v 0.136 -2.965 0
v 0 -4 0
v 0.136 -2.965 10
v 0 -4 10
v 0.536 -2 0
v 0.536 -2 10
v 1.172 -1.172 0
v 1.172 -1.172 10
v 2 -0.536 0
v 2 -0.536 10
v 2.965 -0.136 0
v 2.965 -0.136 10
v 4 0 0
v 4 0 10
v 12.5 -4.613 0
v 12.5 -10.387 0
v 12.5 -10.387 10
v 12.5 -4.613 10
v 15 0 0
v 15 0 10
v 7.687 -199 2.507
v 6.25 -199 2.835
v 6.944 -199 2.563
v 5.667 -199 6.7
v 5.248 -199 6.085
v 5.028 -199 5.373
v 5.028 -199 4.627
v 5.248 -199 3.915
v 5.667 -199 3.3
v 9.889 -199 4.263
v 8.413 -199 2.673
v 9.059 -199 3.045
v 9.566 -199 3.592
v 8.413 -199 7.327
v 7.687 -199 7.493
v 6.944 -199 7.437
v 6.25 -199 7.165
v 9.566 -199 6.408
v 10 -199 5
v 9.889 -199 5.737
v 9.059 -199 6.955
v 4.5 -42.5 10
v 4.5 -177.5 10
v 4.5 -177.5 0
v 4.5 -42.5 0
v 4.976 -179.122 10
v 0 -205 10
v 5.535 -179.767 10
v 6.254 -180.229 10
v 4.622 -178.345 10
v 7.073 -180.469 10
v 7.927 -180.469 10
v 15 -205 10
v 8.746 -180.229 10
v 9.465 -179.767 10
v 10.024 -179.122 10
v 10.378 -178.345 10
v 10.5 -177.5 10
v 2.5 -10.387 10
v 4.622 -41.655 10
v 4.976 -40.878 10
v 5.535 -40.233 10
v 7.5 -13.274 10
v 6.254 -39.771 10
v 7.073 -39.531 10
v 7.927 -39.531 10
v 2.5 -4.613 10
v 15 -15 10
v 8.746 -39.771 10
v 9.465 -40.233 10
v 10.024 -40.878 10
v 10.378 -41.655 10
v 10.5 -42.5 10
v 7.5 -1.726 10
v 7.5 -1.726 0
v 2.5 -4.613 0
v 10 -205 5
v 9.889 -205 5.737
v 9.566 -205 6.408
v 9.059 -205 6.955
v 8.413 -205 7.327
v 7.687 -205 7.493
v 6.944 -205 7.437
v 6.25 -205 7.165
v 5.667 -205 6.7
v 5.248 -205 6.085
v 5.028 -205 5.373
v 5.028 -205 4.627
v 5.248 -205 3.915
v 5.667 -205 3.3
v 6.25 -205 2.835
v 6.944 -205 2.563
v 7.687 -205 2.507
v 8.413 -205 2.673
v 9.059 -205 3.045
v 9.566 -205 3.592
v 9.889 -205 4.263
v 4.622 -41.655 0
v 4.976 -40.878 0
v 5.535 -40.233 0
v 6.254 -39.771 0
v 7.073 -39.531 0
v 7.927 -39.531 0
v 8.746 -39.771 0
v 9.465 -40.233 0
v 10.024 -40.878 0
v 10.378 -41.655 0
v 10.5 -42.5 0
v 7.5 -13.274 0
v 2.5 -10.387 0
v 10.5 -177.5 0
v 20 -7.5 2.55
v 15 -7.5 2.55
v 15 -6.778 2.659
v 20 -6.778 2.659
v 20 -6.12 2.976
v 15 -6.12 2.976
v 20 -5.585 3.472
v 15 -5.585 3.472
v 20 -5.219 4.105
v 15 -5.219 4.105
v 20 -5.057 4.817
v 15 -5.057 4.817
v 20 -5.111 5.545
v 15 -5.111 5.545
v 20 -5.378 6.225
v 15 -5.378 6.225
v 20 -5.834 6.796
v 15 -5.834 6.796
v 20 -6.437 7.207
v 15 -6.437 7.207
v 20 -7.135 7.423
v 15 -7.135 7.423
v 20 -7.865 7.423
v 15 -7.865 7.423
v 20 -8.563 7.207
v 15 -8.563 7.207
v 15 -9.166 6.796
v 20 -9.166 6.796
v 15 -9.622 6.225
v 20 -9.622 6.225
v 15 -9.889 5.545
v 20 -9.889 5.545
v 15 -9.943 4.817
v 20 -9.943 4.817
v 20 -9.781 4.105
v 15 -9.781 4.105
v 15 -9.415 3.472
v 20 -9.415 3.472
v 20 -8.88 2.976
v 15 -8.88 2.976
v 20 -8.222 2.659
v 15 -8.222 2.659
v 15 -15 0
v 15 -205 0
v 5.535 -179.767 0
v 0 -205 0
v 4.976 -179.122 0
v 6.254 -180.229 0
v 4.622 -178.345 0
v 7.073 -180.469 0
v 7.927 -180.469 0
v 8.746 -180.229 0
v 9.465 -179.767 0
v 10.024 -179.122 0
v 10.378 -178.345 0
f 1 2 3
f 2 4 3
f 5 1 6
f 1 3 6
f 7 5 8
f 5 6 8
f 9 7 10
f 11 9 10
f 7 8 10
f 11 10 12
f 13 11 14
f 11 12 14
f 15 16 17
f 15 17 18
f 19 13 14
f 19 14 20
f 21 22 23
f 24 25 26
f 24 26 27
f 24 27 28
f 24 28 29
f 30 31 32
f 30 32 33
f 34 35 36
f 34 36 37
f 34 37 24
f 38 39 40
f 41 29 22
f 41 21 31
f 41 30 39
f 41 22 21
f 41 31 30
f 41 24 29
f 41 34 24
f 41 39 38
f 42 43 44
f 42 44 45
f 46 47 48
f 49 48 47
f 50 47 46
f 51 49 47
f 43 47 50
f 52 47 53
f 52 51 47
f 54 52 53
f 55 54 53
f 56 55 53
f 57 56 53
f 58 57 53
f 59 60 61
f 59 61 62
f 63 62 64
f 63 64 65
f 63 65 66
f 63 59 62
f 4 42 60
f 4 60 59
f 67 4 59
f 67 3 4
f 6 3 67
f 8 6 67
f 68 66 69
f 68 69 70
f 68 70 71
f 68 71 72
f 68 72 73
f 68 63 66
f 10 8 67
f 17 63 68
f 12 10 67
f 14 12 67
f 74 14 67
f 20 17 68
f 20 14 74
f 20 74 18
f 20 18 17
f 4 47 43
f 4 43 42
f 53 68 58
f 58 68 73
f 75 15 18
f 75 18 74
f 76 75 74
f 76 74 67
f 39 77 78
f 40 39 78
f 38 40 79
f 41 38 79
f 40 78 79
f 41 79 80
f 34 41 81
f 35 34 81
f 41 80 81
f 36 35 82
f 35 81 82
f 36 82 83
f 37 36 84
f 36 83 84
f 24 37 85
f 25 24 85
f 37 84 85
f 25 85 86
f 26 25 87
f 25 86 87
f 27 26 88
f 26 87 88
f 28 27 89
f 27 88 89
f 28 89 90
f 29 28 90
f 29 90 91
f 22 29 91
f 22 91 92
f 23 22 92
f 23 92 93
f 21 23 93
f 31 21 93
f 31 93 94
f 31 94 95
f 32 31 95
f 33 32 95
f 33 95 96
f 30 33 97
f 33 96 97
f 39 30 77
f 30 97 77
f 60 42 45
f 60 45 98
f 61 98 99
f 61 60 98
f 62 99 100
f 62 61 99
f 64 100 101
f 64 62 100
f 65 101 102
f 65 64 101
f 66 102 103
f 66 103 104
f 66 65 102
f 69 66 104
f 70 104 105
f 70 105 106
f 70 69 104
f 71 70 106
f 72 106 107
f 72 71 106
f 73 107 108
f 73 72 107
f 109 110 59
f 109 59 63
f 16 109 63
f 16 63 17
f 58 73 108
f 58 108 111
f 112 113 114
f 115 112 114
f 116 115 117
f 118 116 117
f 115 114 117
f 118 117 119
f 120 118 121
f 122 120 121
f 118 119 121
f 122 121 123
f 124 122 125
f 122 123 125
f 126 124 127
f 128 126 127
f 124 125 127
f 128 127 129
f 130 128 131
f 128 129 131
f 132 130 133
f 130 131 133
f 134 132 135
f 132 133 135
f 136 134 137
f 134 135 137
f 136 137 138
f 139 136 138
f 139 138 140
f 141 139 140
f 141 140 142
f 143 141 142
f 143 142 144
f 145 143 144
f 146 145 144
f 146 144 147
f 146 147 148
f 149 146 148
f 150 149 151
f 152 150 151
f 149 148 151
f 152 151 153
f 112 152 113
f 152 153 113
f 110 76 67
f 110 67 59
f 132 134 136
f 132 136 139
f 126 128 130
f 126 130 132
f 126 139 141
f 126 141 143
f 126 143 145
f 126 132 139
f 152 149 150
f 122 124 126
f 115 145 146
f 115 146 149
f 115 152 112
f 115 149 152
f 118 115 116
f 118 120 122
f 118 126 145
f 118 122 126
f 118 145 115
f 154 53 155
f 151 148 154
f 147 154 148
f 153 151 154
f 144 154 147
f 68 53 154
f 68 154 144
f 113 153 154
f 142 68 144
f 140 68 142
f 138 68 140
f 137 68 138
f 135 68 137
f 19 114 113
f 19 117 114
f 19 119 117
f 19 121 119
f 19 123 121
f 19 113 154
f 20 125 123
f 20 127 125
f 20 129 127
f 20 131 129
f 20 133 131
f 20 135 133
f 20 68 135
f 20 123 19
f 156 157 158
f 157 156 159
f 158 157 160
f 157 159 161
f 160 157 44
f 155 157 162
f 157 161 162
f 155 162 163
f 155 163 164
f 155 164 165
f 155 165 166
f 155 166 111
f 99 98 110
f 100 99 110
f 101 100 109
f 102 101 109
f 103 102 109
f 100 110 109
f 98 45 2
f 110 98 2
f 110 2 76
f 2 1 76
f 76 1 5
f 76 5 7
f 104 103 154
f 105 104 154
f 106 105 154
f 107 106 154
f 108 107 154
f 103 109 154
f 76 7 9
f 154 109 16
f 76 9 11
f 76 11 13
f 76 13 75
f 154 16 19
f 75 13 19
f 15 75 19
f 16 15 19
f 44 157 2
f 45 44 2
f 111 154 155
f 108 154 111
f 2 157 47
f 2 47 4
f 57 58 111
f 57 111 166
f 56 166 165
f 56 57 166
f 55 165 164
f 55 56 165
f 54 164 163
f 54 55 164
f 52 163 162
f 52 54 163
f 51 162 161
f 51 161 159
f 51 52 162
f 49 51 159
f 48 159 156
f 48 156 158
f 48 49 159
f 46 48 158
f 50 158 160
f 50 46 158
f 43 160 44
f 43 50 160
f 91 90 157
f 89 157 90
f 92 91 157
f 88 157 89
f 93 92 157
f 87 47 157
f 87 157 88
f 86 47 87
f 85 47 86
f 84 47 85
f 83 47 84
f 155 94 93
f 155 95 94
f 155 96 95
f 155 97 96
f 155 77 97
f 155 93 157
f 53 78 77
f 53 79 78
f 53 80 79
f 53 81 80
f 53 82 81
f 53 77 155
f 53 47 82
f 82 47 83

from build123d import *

# Parameters (mm, degrees)
CROQUIS1_W              = 220
CROQUIS1_H              = 220
CROQUIS1_W_2            = 190
CROQUIS1_H_2            = 190
SALIENTE_EXTRUIR1_DEPTH = 10
REDONDEO2_R             = 4
CORTAR_EXTRUIR4_DEPTH   = 10
CORTAR_EXTRUIR5_DEPTH   = 10
CROQUIS6_W              = 214.832400875
CROQUIS6_H              = 220
CORTAR_EXTRUIR6_DEPTH   = 10
CROQUIS7_R              = 2.45
SALIENTE_EXTRUIR2_DEPTH = 5
CROQUIS11_W             = 15
CROQUIS11_H             = 15
CORTAR_EXTRUIR9_DEPTH   = 10
CROQUIS12_R             = 2.5
CORTAR_EXTRUIR10_DEPTH  = 6


with BuildPart() as part:
    # Croquis1 → Saliente-Extruir1 (new body)
    with BuildSketch(Plane.XY):
        with Locations((110, -110)):
            Rectangle(CROQUIS1_W, CROQUIS1_H)
        with Locations((110, -110)):
            Rectangle(CROQUIS1_W_2, CROQUIS1_H_2, mode=Mode.SUBTRACT)
        Polygon((212.5, -13.273502692), (217.5, -10.386751346), (217.5, -4.613248654), (212.5, -1.726497308), (207.5, -4.613248654), (207.5, -10.386751346), align=None, mode=Mode.SUBTRACT)
        Polygon((7.5, -13.273502692), (12.5, -10.386751346), (12.5, -4.613248654), (7.5, -1.726497308), (2.5, -4.613248654), (2.5, -10.386751346), align=None, mode=Mode.SUBTRACT)
        Polygon((212.5, -218.273502692), (217.5, -215.386751346), (217.5, -209.613248654), (212.5, -206.726497308), (207.5, -209.613248654), (207.5, -215.386751346), align=None, mode=Mode.SUBTRACT)
        Polygon((7.5, -218.273502692), (12.5, -215.386751346), (12.5, -209.613248654), (7.5, -206.726497308), (2.5, -209.613248654), (2.5, -215.386751346), align=None, mode=Mode.SUBTRACT)
    extrude(amount=SALIENTE_EXTRUIR1_DEPTH)

    # Redondeo2
    redondeo2_edges = [part.edges().sort_by_distance(p)[0] for p in [
        (0, 0, 5),
        (220, 0, 5),
        (220, -220, 5),
        (0, -220, 5),
    ]]
    fillet(redondeo2_edges, radius=REDONDEO2_R)

    # Croquis4 → Cortar-Extruir4 (cut)
    with BuildSketch(Plane.XY.offset(10)):
        with BuildLine():
            Line((42.5, -4.5), (177.5, -4.5))
            ThreePointArc((177.5, -4.5), (180.5, -7.5), (177.5, -10.5))
            Line((177.5, -10.5), (42.5, -10.5))
            ThreePointArc((42.5, -10.5), (39.5, -7.5), (42.5, -4.5))
        make_face()
        with BuildLine():
            Line((42.5, -215.5), (177.5, -215.5))
            ThreePointArc((177.5, -215.5), (180.5, -212.5), (177.5, -209.5))
            Line((177.5, -209.5), (42.5, -209.5))
            ThreePointArc((42.5, -209.5), (39.5, -212.5), (42.5, -215.5))
        make_face()
    extrude(amount=-CORTAR_EXTRUIR4_DEPTH, mode=Mode.SUBTRACT)

    # Croquis5 → Cortar-Extruir5 (cut)
    with BuildSketch(Plane.XY.offset(10)):
        with BuildLine():
            Line((10.5, -42.5), (10.5, -177.5))
            ThreePointArc((10.5, -177.5), (7.5, -180.5), (4.5, -177.5))
            Line((4.5, -177.5), (4.5, -42.5))
            ThreePointArc((4.5, -42.5), (7.5, -39.5), (10.5, -42.5))
        make_face()
        with BuildLine():
            Line((209.5, -42.5), (209.5, -177.5))
            ThreePointArc((209.5, -177.5), (212.5, -180.5), (215.5, -177.5))
            Line((215.5, -177.5), (215.5, -42.5))
            ThreePointArc((215.5, -42.5), (212.5, -39.5), (209.5, -42.5))
        make_face()
    extrude(amount=-CORTAR_EXTRUIR5_DEPTH, mode=Mode.SUBTRACT)

    # Croquis6 → Cortar-Extruir6 (cut)
    with BuildSketch(Plane.XY.offset(10)):
        with Locations((122.416200438, -110)):
            Rectangle(CROQUIS6_W, CROQUIS6_H)
    extrude(amount=-CORTAR_EXTRUIR6_DEPTH, mode=Mode.SUBTRACT)

    # Croquis7 → Saliente-Extruir2 (add)
    with BuildSketch(Plane(origin=(15, 0, 0), x_dir=(0, 0, -1), z_dir=(1, 0, 0))):
        with Locations((-5, -7.5)):
            Circle(CROQUIS7_R)
    extrude(amount=SALIENTE_EXTRUIR2_DEPTH)

    # Croquis11 → Cortar-Extruir9 (cut)
    with BuildSketch(Plane.XY.offset(10)):
        with Locations((7.5, -212.5)):
            Rectangle(CROQUIS11_W, CROQUIS11_H)
    extrude(amount=-CORTAR_EXTRUIR9_DEPTH, mode=Mode.SUBTRACT)

    # Croquis12 → Cortar-Extruir10 (cut)
    with BuildSketch(Plane.XZ.offset(205)):
        with Locations((7.5, 5)):
            Circle(CROQUIS12_R)
    extrude(amount=-CORTAR_EXTRUIR10_DEPTH, mode=Mode.SUBTRACT)


solid = part.part
